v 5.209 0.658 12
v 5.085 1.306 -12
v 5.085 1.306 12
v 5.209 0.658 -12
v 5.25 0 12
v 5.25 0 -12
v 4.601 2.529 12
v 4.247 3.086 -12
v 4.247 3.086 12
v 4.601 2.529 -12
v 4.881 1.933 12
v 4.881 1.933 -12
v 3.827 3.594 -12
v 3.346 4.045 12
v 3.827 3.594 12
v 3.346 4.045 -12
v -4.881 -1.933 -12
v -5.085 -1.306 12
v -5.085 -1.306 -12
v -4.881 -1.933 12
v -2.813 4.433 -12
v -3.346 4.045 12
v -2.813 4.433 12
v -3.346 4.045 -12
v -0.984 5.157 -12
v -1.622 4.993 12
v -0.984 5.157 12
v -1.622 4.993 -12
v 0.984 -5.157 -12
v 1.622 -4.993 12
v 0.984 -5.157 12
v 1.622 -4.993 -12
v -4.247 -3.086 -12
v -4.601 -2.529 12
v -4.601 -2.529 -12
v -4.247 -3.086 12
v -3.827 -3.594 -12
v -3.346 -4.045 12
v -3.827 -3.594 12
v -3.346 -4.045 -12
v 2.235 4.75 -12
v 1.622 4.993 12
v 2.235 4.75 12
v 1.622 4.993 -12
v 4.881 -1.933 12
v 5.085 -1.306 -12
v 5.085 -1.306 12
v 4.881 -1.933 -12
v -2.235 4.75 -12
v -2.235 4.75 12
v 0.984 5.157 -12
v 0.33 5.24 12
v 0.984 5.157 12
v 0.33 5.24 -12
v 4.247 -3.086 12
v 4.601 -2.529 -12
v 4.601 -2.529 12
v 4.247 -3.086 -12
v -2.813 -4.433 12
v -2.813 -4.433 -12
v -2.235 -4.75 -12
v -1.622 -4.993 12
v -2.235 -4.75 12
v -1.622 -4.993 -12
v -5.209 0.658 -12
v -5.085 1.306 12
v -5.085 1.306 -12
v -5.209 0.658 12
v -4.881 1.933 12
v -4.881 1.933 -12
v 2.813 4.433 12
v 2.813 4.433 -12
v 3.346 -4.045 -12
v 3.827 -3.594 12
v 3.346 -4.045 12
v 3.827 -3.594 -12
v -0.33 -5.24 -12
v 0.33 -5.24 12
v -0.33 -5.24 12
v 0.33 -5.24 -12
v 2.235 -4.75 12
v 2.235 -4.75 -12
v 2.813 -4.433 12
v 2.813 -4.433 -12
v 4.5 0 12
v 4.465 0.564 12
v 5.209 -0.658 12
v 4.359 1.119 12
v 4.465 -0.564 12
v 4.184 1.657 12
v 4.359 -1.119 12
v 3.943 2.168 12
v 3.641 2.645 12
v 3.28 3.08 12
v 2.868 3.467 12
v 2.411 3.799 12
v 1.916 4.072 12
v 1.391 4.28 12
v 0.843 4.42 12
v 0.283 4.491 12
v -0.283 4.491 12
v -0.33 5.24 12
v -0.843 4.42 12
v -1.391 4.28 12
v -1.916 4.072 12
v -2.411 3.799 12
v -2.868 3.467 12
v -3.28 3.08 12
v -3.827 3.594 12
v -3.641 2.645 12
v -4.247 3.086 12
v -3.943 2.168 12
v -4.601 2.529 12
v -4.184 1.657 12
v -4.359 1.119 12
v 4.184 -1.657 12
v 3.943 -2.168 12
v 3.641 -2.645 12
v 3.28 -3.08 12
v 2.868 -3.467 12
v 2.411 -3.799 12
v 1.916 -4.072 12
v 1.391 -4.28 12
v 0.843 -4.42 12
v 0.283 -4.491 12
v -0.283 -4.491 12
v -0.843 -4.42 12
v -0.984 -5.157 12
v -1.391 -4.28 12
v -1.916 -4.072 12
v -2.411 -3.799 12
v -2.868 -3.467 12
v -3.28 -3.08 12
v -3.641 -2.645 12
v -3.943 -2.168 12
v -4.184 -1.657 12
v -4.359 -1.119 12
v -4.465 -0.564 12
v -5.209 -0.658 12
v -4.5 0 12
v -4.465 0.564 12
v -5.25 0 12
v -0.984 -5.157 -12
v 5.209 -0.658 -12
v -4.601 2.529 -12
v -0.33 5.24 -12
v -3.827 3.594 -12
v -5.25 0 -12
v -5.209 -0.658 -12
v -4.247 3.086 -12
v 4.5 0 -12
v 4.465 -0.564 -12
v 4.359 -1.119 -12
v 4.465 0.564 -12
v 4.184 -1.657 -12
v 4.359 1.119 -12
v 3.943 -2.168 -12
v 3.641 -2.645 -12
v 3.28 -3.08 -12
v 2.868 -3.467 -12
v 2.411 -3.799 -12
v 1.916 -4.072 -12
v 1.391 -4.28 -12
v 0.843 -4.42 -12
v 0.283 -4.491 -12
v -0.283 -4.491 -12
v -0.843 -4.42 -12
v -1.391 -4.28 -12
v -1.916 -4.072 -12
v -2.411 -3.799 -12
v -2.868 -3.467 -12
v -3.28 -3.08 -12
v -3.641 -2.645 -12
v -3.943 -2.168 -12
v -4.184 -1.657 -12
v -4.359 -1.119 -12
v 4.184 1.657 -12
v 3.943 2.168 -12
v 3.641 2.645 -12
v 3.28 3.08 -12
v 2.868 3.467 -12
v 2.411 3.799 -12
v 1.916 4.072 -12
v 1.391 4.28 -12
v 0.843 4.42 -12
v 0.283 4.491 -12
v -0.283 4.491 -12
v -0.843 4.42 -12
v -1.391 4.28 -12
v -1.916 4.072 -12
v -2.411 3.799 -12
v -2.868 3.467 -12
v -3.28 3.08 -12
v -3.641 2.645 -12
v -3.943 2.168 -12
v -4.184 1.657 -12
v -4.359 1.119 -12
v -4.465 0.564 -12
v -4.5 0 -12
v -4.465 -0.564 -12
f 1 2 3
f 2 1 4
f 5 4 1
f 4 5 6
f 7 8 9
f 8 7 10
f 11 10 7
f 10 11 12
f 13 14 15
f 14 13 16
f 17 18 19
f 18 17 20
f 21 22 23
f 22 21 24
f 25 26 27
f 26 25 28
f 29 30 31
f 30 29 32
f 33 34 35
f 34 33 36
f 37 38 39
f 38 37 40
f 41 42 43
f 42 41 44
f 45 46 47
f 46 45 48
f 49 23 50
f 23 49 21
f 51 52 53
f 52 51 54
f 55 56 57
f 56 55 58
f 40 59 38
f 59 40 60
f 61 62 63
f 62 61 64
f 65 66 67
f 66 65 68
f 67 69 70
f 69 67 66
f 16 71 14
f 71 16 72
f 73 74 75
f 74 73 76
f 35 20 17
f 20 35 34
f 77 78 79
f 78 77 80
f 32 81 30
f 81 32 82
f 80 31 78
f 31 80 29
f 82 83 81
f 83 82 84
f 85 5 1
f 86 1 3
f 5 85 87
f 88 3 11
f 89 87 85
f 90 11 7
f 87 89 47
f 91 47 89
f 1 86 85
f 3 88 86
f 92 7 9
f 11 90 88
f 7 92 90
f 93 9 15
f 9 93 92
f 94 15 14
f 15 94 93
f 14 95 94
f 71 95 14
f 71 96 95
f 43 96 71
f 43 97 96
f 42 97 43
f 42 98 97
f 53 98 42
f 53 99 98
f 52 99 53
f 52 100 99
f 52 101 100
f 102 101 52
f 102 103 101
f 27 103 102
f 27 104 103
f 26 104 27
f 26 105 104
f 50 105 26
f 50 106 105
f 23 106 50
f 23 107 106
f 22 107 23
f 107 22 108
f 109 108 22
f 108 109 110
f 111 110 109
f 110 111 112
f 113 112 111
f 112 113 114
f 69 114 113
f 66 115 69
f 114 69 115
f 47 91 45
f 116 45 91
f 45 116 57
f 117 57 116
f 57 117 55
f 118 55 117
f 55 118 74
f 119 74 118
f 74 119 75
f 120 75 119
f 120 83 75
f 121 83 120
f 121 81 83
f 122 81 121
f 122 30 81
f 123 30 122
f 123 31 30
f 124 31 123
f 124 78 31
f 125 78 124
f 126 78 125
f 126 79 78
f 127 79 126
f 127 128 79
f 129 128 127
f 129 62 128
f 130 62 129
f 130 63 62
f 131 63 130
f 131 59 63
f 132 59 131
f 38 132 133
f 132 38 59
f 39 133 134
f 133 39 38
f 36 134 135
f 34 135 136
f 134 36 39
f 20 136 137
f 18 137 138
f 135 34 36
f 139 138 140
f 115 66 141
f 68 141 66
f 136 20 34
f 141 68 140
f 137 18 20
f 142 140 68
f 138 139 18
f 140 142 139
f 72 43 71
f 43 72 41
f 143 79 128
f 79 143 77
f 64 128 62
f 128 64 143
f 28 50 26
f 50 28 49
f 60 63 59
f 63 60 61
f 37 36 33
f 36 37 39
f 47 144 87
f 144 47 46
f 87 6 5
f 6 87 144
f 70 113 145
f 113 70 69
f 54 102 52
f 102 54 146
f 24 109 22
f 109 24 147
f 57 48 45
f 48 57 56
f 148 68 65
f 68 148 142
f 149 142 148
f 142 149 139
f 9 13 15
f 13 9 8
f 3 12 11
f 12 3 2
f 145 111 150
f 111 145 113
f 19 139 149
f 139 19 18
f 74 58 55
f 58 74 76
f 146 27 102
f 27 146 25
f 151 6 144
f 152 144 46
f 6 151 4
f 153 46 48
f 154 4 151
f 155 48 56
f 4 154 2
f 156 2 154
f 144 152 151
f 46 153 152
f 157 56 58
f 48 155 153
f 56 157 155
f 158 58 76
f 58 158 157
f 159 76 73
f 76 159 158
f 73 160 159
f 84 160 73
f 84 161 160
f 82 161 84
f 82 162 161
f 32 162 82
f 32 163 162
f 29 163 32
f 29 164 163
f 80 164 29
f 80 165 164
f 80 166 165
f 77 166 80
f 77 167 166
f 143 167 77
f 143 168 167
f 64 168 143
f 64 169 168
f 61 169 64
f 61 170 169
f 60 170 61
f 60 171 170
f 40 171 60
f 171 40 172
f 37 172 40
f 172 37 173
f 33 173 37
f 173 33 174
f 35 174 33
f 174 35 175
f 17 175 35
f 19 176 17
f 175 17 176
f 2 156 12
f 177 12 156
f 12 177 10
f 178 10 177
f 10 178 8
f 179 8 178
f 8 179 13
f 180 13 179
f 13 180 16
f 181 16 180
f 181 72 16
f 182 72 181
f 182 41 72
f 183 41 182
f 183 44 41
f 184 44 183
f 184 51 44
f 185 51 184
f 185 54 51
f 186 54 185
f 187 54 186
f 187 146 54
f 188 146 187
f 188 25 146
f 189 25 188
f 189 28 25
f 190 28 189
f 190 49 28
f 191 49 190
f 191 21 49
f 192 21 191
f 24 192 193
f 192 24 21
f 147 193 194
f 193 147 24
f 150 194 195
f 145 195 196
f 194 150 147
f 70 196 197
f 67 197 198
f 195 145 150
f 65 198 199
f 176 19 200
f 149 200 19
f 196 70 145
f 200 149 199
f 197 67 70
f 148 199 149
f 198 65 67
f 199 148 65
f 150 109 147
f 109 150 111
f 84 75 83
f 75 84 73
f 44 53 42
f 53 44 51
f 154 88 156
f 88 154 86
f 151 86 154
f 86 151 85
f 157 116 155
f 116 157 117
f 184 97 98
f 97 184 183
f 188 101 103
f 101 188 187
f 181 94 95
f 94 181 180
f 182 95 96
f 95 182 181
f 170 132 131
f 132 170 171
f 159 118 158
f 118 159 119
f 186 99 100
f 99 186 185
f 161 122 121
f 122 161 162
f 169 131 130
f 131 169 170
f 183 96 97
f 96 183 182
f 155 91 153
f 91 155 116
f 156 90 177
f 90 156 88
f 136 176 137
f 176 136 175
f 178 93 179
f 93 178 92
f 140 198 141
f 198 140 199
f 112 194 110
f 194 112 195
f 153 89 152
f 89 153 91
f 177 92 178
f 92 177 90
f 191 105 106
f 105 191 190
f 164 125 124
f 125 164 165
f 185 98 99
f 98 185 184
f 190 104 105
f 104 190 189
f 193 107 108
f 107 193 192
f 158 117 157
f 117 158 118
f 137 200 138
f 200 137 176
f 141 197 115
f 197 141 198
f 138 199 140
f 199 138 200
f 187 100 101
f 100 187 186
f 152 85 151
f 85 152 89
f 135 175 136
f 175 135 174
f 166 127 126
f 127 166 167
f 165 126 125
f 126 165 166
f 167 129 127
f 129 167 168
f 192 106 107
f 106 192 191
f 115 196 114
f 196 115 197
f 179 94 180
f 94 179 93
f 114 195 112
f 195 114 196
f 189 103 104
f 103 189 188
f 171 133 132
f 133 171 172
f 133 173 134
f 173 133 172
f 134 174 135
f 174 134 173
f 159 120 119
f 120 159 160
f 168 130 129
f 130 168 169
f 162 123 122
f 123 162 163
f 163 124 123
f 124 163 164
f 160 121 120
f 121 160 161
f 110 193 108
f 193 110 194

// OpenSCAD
$fn = 50;


difference() {
	union() {
		translate(v = [0, 0, -12.0000000000]) {
			cylinder(h = 24, r = 5.2500000000);
		}
	}
	union() {
		translate(v = [0, 0, -100.0000000000]) {
			cylinder(h = 200, r = 4.5000000000);
		}
	}
}
